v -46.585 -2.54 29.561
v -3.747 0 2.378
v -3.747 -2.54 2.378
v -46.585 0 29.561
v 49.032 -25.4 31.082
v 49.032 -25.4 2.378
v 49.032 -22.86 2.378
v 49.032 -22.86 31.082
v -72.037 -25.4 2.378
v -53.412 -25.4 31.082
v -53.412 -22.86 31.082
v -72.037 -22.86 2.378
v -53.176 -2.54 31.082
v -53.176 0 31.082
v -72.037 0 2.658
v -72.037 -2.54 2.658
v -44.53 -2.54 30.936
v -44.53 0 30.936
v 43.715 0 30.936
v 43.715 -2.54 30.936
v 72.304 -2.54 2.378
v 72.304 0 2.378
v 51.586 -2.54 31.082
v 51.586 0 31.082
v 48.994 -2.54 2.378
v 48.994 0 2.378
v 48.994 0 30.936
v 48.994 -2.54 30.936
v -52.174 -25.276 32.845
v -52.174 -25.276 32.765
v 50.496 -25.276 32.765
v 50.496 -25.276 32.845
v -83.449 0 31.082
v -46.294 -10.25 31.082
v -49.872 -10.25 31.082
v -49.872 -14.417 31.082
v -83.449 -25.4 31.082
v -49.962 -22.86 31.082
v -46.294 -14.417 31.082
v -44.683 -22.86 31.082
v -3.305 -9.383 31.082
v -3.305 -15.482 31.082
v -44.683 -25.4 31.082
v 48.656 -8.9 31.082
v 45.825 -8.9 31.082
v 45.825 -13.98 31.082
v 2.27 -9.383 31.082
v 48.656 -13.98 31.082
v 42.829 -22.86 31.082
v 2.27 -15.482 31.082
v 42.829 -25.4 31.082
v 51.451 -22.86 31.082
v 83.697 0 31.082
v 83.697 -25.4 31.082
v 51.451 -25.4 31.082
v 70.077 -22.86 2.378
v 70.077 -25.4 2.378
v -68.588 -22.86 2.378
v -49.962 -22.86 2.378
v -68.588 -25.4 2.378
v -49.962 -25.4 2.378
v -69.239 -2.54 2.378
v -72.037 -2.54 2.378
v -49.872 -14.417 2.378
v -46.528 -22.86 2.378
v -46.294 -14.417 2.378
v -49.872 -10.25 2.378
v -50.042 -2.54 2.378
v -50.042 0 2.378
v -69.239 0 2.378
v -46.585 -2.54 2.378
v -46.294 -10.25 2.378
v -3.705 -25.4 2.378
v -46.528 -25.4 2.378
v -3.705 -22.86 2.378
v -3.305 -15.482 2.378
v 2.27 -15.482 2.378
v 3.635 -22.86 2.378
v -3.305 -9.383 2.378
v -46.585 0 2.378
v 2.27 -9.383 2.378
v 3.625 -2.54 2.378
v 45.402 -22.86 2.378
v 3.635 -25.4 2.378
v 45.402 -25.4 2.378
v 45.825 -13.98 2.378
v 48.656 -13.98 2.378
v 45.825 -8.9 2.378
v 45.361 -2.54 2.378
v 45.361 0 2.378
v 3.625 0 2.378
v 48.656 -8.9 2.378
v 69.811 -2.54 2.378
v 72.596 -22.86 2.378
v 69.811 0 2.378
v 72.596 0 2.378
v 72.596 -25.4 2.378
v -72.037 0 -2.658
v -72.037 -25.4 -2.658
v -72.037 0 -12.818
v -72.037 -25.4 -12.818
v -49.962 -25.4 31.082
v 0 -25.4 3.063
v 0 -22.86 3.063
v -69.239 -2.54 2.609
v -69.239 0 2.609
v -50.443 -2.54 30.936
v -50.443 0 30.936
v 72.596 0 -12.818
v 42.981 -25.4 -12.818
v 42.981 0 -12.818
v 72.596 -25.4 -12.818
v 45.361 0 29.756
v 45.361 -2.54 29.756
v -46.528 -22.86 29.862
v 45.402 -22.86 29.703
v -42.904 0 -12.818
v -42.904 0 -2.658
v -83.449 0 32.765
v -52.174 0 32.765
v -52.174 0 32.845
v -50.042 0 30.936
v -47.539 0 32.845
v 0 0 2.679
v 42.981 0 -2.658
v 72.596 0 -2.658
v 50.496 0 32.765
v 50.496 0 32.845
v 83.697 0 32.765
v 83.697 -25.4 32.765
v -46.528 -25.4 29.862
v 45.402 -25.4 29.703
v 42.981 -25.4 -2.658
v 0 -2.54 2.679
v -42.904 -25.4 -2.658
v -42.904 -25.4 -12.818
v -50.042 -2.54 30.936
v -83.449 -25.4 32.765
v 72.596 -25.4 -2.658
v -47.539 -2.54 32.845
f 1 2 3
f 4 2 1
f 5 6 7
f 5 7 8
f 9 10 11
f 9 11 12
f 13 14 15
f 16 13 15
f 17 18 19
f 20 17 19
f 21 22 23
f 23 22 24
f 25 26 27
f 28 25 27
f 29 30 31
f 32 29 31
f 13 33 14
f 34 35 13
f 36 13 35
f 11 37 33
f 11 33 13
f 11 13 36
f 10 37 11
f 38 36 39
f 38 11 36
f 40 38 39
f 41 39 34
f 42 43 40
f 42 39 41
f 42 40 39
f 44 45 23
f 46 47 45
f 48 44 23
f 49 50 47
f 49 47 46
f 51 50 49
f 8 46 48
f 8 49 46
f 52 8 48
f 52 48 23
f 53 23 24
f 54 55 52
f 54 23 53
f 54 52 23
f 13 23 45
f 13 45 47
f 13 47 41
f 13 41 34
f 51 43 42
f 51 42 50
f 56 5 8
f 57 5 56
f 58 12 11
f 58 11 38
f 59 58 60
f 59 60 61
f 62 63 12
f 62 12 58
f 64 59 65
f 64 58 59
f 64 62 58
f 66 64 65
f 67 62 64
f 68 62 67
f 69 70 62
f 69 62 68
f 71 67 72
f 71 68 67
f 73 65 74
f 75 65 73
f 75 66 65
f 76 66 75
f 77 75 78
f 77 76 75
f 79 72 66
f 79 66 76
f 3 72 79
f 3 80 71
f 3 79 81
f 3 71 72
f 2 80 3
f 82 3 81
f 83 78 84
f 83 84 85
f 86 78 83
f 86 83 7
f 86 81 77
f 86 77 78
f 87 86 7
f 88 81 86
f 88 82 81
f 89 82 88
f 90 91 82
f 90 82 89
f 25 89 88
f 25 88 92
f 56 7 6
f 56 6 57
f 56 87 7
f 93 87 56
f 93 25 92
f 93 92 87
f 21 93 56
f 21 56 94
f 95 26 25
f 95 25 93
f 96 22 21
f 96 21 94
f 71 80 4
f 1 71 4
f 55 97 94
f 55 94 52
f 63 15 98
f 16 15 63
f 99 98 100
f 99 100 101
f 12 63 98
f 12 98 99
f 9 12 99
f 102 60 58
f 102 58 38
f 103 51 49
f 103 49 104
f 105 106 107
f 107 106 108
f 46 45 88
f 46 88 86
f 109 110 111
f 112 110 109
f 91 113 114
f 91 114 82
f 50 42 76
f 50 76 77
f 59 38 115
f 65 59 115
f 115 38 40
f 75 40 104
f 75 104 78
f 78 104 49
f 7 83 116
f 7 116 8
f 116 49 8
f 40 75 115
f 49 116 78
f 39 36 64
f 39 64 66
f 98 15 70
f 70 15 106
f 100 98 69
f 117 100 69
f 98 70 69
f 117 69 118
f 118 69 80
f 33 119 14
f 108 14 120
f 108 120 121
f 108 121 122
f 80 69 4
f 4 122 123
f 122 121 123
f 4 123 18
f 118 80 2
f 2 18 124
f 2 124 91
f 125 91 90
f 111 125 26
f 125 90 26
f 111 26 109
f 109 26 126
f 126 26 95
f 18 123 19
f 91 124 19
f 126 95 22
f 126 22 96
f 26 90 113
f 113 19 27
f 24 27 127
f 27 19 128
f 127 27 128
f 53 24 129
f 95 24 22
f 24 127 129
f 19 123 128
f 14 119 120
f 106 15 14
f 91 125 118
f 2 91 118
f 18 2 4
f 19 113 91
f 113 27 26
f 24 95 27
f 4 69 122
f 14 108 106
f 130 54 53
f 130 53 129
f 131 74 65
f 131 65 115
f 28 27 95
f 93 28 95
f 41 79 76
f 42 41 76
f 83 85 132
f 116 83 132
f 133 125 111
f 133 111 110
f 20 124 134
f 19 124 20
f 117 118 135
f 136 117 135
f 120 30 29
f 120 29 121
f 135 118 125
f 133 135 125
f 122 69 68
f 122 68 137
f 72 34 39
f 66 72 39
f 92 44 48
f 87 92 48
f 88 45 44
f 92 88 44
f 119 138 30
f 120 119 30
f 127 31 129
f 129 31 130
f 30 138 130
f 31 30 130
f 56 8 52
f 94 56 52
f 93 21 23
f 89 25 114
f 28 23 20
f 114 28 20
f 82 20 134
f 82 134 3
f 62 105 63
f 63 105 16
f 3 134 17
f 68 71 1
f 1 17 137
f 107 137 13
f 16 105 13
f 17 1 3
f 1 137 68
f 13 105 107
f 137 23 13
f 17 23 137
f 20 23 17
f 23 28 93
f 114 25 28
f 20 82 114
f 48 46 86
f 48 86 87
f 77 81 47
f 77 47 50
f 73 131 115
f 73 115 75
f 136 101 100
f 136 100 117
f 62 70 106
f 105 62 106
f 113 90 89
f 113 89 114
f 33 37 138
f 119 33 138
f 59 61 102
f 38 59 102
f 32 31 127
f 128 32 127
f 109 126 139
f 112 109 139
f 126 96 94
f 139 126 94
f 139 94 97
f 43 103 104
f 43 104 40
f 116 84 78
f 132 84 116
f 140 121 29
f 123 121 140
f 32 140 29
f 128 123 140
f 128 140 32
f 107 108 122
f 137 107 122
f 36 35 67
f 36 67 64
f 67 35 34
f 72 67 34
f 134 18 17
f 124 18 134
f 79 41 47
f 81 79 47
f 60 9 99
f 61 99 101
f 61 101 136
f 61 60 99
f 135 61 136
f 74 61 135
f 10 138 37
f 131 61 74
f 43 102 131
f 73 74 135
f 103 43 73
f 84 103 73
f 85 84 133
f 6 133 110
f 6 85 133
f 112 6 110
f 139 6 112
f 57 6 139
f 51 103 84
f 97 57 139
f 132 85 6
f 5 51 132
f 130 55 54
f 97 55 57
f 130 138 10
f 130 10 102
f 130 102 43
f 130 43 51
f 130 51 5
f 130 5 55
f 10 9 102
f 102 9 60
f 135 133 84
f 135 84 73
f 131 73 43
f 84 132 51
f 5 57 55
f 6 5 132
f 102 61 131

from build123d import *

# Parameters (mm, degrees)
F0_W      = 144.6334645152
F0_H      = 5.0355943386
F1_DEPTH  = 25.4
F3_DEPTH  = 2.54
F5_DEPTH  = 2.54
F6_W      = 102.6701740921
F6_H      = 25.2759195864
F7_DEPTH  = 0.254
F8_W      = 3.4340582788
F8_H      = 30.7748552877
F9_DEPTH  = 2.54
F10_W     = 3.6297179759
F10_H     = 32.1495756507
F11_DEPTH = 2.54
F12_W     = 3.6330670118
F12_H     = 30.970800959
F13_DEPTH = 2.54
F14_W     = 3.4567825496
F14_H     = 30.4196920479
F15_DEPTH = 2.54
F17_DEPTH = 2.54
F19_DEPTH = 2.54
F20_W     = 5.5748282466
F20_H     = 6.0991924256
F21_DEPTH = 33.02
F22_W     = 3.5782083869
F22_H     = 4.1668945923
F23_DEPTH = 33.02
F24_W     = 2.8318321891
F24_H     = 5.08
F25_DEPTH = 33.02
F26_W     = 167.146153748
F26_H     = 1.6835723072
F27_DEPTH = 25.4
F28_W     = 29.1326753795
F28_H     = 25.4
F29_DEPTH = 10.16
F30_W     = 29.6150818467
F30_H     = 25.4
F31_DEPTH = 10.16


with BuildPart() as f1:
    # F0 (on Front) → F1 (new body)
    with BuildSketch(Plane.XZ):
        with Locations((0.2797581255, -0.1398775494)):
            Rectangle(F0_W, F0_H)
    extrude(amount=F1_DEPTH)

    # F2 (on Front) → F3 (join)
    with BuildSketch(Plane.XZ):
        Polygon((-72.0369741321, 2.6576747186), (-72.0369741321, 0), (-69.2392249852, 0), (-69.2392249852, 2.6093864363), (-50.4433400929, 30.9355836362), (48.9940978587, 30.9355836362), (69.989785552, 2.1328825969), (69.989785552, 0), (72.3275691271, 0), (72.3275691271, 2.345408313), (50.4958182573, 32.5914844871), (-52.1743558347, 32.5914844871), align=None)
    extrude(amount=F3_DEPTH)

    # F4 (on face) → F5 (join)
    with BuildSketch(Plane.XZ.offset(25.4)):
        Polygon((-72.0369741321, 2.3779196199), (-72.0369741321, -0.1398775494), (-68.5875401776, 0), (-68.5875401776, 2.3779196199), (-49.9622374773, 31.0818161815), (49.0318536758, 31.0818161815), (70.0765177608, 2.3779196199), (70.0765177608, 0), (72.5964903831, 0), (72.5964903831, 2.3779196199), (50.2103567123, 32.7653884888), (-52.319239825, 32.7653884888), align=None)
    extrude(amount=-F5_DEPTH)

    # F6 (on face) → F7 (join)
    with BuildSketch(Plane.XY.offset(32.5914844871)):
        with Locations((-0.8392687887, -12.6379597932)):
            Rectangle(F6_W, F6_H)
    extrude(amount=F7_DEPTH)

    # F8 (on face) → F9 (join)
    with BuildSketch(Plane.XZ.offset(25.4)):
        with Locations((-48.2452083379, 16.5978105506)):
            Rectangle(F8_W, F8_H)
    extrude(amount=-F9_DEPTH)

    # F10 (on face) → F11 (join)
    with BuildSketch(Plane.XZ.offset(25.4)):
        with Locations((47.2169946879, 16.0747878253)):
            Rectangle(F10_W, F10_H)
    extrude(amount=-F11_DEPTH)

    # F12 (on face) → F13 (join)
    with BuildSketch(Plane(origin=(0, 0, 0), x_dir=(-1, 0, 0), z_dir=(0, 1, 0))):
        with Locations((-47.1775643528, 16.3971947914)):
            Rectangle(F12_W, F12_H)
    extrude(amount=-F13_DEPTH)

    # F14 (on face) → F15 (join)
    with BuildSketch(Plane(origin=(0, 0, 0), x_dir=(-1, 0, 0), z_dir=(0, 1, 0))):
        with Locations((48.3132656664, 16.6731329518)):
            Rectangle(F14_W, F14_H)
    extrude(amount=-F15_DEPTH)

    # F16 (on face) → F17 (join)
    with BuildSketch(Plane(origin=(0, 0, 0), x_dir=(-1, 0, 0), z_dir=(0, 1, 0))):
        Polygon((-45.3610308468, 31.9995991886), (-47.1585355699, 30.9355836362), (0, 0), (48.751424998, 30.9355836362), (47.5394830392, 32.8454844871), (0, 2.678947742), align=None)
    extrude(amount=-F17_DEPTH)

    # F18 (on face) → F19 (join)
    with BuildSketch(Plane.XZ.offset(25.4)):
        Polygon((-46.5281791985, 32.2389304638), (-48.4291017056, 31.0818161815), (0, 0), (47.5102737546, 31.0818161815), (45.4021357, 32.7653884888), (0, 3.0627426281), align=None)
    extrude(amount=-F19_DEPTH)

    # F20 (on face) → F21 (join)
    with BuildSketch(Plane(origin=(0, 0, 32.5914844871), x_dir=(1, 0, 0), z_dir=(0, 0, -1))):
        with Locations((-0.5173498066, 12.4324662611)):
            Rectangle(F20_W, F20_H)
    extrude(amount=F21_DEPTH)

    # F22 (on face) → F23 (join)
    with BuildSketch(Plane(origin=(0, 0, 32.5914844871), x_dir=(1, 0, 0), z_dir=(0, 0, -1))):
        with Locations((-48.0833910406, 12.3338256963)):
            Rectangle(F22_W, F22_H)
    extrude(amount=F23_DEPTH)

    # F24 (on face) → F25 (join)
    with BuildSketch(Plane(origin=(0, 0, 32.5914844871), x_dir=(1, 0, 0), z_dir=(0, 0, -1))):
        with Locations((47.2405347973, 11.4395930432)):
            Rectangle(F24_W, F24_H)
    extrude(amount=F25_DEPTH)

    # F26 (on face) → F27 (join)
    with BuildSketch(Plane.XZ.offset(25.4)):
        with Locations((0.1240931451, 31.9236023352)):
            Rectangle(F26_W, F26_H)
    extrude(amount=-F27_DEPTH)

    # F28 (on face) → F29 (join)
    with BuildSketch(Plane(origin=(0, 0, -2.6576747186), x_dir=(1, 0, 0), z_dir=(0, 0, -1))):
        with Locations((-57.4706364423, 12.7)):
            Rectangle(F28_W, F28_H)
    extrude(amount=F29_DEPTH)

    # F30 (on face) → F31 (join)
    with BuildSketch(Plane(origin=(0, 0, -2.6576747186), x_dir=(1, 0, 0), z_dir=(0, 0, -1))):
        with Locations((57.7889494598, 12.7)):
            Rectangle(F30_W, F30_H)
    extrude(amount=F31_DEPTH)


solid = f1.part
